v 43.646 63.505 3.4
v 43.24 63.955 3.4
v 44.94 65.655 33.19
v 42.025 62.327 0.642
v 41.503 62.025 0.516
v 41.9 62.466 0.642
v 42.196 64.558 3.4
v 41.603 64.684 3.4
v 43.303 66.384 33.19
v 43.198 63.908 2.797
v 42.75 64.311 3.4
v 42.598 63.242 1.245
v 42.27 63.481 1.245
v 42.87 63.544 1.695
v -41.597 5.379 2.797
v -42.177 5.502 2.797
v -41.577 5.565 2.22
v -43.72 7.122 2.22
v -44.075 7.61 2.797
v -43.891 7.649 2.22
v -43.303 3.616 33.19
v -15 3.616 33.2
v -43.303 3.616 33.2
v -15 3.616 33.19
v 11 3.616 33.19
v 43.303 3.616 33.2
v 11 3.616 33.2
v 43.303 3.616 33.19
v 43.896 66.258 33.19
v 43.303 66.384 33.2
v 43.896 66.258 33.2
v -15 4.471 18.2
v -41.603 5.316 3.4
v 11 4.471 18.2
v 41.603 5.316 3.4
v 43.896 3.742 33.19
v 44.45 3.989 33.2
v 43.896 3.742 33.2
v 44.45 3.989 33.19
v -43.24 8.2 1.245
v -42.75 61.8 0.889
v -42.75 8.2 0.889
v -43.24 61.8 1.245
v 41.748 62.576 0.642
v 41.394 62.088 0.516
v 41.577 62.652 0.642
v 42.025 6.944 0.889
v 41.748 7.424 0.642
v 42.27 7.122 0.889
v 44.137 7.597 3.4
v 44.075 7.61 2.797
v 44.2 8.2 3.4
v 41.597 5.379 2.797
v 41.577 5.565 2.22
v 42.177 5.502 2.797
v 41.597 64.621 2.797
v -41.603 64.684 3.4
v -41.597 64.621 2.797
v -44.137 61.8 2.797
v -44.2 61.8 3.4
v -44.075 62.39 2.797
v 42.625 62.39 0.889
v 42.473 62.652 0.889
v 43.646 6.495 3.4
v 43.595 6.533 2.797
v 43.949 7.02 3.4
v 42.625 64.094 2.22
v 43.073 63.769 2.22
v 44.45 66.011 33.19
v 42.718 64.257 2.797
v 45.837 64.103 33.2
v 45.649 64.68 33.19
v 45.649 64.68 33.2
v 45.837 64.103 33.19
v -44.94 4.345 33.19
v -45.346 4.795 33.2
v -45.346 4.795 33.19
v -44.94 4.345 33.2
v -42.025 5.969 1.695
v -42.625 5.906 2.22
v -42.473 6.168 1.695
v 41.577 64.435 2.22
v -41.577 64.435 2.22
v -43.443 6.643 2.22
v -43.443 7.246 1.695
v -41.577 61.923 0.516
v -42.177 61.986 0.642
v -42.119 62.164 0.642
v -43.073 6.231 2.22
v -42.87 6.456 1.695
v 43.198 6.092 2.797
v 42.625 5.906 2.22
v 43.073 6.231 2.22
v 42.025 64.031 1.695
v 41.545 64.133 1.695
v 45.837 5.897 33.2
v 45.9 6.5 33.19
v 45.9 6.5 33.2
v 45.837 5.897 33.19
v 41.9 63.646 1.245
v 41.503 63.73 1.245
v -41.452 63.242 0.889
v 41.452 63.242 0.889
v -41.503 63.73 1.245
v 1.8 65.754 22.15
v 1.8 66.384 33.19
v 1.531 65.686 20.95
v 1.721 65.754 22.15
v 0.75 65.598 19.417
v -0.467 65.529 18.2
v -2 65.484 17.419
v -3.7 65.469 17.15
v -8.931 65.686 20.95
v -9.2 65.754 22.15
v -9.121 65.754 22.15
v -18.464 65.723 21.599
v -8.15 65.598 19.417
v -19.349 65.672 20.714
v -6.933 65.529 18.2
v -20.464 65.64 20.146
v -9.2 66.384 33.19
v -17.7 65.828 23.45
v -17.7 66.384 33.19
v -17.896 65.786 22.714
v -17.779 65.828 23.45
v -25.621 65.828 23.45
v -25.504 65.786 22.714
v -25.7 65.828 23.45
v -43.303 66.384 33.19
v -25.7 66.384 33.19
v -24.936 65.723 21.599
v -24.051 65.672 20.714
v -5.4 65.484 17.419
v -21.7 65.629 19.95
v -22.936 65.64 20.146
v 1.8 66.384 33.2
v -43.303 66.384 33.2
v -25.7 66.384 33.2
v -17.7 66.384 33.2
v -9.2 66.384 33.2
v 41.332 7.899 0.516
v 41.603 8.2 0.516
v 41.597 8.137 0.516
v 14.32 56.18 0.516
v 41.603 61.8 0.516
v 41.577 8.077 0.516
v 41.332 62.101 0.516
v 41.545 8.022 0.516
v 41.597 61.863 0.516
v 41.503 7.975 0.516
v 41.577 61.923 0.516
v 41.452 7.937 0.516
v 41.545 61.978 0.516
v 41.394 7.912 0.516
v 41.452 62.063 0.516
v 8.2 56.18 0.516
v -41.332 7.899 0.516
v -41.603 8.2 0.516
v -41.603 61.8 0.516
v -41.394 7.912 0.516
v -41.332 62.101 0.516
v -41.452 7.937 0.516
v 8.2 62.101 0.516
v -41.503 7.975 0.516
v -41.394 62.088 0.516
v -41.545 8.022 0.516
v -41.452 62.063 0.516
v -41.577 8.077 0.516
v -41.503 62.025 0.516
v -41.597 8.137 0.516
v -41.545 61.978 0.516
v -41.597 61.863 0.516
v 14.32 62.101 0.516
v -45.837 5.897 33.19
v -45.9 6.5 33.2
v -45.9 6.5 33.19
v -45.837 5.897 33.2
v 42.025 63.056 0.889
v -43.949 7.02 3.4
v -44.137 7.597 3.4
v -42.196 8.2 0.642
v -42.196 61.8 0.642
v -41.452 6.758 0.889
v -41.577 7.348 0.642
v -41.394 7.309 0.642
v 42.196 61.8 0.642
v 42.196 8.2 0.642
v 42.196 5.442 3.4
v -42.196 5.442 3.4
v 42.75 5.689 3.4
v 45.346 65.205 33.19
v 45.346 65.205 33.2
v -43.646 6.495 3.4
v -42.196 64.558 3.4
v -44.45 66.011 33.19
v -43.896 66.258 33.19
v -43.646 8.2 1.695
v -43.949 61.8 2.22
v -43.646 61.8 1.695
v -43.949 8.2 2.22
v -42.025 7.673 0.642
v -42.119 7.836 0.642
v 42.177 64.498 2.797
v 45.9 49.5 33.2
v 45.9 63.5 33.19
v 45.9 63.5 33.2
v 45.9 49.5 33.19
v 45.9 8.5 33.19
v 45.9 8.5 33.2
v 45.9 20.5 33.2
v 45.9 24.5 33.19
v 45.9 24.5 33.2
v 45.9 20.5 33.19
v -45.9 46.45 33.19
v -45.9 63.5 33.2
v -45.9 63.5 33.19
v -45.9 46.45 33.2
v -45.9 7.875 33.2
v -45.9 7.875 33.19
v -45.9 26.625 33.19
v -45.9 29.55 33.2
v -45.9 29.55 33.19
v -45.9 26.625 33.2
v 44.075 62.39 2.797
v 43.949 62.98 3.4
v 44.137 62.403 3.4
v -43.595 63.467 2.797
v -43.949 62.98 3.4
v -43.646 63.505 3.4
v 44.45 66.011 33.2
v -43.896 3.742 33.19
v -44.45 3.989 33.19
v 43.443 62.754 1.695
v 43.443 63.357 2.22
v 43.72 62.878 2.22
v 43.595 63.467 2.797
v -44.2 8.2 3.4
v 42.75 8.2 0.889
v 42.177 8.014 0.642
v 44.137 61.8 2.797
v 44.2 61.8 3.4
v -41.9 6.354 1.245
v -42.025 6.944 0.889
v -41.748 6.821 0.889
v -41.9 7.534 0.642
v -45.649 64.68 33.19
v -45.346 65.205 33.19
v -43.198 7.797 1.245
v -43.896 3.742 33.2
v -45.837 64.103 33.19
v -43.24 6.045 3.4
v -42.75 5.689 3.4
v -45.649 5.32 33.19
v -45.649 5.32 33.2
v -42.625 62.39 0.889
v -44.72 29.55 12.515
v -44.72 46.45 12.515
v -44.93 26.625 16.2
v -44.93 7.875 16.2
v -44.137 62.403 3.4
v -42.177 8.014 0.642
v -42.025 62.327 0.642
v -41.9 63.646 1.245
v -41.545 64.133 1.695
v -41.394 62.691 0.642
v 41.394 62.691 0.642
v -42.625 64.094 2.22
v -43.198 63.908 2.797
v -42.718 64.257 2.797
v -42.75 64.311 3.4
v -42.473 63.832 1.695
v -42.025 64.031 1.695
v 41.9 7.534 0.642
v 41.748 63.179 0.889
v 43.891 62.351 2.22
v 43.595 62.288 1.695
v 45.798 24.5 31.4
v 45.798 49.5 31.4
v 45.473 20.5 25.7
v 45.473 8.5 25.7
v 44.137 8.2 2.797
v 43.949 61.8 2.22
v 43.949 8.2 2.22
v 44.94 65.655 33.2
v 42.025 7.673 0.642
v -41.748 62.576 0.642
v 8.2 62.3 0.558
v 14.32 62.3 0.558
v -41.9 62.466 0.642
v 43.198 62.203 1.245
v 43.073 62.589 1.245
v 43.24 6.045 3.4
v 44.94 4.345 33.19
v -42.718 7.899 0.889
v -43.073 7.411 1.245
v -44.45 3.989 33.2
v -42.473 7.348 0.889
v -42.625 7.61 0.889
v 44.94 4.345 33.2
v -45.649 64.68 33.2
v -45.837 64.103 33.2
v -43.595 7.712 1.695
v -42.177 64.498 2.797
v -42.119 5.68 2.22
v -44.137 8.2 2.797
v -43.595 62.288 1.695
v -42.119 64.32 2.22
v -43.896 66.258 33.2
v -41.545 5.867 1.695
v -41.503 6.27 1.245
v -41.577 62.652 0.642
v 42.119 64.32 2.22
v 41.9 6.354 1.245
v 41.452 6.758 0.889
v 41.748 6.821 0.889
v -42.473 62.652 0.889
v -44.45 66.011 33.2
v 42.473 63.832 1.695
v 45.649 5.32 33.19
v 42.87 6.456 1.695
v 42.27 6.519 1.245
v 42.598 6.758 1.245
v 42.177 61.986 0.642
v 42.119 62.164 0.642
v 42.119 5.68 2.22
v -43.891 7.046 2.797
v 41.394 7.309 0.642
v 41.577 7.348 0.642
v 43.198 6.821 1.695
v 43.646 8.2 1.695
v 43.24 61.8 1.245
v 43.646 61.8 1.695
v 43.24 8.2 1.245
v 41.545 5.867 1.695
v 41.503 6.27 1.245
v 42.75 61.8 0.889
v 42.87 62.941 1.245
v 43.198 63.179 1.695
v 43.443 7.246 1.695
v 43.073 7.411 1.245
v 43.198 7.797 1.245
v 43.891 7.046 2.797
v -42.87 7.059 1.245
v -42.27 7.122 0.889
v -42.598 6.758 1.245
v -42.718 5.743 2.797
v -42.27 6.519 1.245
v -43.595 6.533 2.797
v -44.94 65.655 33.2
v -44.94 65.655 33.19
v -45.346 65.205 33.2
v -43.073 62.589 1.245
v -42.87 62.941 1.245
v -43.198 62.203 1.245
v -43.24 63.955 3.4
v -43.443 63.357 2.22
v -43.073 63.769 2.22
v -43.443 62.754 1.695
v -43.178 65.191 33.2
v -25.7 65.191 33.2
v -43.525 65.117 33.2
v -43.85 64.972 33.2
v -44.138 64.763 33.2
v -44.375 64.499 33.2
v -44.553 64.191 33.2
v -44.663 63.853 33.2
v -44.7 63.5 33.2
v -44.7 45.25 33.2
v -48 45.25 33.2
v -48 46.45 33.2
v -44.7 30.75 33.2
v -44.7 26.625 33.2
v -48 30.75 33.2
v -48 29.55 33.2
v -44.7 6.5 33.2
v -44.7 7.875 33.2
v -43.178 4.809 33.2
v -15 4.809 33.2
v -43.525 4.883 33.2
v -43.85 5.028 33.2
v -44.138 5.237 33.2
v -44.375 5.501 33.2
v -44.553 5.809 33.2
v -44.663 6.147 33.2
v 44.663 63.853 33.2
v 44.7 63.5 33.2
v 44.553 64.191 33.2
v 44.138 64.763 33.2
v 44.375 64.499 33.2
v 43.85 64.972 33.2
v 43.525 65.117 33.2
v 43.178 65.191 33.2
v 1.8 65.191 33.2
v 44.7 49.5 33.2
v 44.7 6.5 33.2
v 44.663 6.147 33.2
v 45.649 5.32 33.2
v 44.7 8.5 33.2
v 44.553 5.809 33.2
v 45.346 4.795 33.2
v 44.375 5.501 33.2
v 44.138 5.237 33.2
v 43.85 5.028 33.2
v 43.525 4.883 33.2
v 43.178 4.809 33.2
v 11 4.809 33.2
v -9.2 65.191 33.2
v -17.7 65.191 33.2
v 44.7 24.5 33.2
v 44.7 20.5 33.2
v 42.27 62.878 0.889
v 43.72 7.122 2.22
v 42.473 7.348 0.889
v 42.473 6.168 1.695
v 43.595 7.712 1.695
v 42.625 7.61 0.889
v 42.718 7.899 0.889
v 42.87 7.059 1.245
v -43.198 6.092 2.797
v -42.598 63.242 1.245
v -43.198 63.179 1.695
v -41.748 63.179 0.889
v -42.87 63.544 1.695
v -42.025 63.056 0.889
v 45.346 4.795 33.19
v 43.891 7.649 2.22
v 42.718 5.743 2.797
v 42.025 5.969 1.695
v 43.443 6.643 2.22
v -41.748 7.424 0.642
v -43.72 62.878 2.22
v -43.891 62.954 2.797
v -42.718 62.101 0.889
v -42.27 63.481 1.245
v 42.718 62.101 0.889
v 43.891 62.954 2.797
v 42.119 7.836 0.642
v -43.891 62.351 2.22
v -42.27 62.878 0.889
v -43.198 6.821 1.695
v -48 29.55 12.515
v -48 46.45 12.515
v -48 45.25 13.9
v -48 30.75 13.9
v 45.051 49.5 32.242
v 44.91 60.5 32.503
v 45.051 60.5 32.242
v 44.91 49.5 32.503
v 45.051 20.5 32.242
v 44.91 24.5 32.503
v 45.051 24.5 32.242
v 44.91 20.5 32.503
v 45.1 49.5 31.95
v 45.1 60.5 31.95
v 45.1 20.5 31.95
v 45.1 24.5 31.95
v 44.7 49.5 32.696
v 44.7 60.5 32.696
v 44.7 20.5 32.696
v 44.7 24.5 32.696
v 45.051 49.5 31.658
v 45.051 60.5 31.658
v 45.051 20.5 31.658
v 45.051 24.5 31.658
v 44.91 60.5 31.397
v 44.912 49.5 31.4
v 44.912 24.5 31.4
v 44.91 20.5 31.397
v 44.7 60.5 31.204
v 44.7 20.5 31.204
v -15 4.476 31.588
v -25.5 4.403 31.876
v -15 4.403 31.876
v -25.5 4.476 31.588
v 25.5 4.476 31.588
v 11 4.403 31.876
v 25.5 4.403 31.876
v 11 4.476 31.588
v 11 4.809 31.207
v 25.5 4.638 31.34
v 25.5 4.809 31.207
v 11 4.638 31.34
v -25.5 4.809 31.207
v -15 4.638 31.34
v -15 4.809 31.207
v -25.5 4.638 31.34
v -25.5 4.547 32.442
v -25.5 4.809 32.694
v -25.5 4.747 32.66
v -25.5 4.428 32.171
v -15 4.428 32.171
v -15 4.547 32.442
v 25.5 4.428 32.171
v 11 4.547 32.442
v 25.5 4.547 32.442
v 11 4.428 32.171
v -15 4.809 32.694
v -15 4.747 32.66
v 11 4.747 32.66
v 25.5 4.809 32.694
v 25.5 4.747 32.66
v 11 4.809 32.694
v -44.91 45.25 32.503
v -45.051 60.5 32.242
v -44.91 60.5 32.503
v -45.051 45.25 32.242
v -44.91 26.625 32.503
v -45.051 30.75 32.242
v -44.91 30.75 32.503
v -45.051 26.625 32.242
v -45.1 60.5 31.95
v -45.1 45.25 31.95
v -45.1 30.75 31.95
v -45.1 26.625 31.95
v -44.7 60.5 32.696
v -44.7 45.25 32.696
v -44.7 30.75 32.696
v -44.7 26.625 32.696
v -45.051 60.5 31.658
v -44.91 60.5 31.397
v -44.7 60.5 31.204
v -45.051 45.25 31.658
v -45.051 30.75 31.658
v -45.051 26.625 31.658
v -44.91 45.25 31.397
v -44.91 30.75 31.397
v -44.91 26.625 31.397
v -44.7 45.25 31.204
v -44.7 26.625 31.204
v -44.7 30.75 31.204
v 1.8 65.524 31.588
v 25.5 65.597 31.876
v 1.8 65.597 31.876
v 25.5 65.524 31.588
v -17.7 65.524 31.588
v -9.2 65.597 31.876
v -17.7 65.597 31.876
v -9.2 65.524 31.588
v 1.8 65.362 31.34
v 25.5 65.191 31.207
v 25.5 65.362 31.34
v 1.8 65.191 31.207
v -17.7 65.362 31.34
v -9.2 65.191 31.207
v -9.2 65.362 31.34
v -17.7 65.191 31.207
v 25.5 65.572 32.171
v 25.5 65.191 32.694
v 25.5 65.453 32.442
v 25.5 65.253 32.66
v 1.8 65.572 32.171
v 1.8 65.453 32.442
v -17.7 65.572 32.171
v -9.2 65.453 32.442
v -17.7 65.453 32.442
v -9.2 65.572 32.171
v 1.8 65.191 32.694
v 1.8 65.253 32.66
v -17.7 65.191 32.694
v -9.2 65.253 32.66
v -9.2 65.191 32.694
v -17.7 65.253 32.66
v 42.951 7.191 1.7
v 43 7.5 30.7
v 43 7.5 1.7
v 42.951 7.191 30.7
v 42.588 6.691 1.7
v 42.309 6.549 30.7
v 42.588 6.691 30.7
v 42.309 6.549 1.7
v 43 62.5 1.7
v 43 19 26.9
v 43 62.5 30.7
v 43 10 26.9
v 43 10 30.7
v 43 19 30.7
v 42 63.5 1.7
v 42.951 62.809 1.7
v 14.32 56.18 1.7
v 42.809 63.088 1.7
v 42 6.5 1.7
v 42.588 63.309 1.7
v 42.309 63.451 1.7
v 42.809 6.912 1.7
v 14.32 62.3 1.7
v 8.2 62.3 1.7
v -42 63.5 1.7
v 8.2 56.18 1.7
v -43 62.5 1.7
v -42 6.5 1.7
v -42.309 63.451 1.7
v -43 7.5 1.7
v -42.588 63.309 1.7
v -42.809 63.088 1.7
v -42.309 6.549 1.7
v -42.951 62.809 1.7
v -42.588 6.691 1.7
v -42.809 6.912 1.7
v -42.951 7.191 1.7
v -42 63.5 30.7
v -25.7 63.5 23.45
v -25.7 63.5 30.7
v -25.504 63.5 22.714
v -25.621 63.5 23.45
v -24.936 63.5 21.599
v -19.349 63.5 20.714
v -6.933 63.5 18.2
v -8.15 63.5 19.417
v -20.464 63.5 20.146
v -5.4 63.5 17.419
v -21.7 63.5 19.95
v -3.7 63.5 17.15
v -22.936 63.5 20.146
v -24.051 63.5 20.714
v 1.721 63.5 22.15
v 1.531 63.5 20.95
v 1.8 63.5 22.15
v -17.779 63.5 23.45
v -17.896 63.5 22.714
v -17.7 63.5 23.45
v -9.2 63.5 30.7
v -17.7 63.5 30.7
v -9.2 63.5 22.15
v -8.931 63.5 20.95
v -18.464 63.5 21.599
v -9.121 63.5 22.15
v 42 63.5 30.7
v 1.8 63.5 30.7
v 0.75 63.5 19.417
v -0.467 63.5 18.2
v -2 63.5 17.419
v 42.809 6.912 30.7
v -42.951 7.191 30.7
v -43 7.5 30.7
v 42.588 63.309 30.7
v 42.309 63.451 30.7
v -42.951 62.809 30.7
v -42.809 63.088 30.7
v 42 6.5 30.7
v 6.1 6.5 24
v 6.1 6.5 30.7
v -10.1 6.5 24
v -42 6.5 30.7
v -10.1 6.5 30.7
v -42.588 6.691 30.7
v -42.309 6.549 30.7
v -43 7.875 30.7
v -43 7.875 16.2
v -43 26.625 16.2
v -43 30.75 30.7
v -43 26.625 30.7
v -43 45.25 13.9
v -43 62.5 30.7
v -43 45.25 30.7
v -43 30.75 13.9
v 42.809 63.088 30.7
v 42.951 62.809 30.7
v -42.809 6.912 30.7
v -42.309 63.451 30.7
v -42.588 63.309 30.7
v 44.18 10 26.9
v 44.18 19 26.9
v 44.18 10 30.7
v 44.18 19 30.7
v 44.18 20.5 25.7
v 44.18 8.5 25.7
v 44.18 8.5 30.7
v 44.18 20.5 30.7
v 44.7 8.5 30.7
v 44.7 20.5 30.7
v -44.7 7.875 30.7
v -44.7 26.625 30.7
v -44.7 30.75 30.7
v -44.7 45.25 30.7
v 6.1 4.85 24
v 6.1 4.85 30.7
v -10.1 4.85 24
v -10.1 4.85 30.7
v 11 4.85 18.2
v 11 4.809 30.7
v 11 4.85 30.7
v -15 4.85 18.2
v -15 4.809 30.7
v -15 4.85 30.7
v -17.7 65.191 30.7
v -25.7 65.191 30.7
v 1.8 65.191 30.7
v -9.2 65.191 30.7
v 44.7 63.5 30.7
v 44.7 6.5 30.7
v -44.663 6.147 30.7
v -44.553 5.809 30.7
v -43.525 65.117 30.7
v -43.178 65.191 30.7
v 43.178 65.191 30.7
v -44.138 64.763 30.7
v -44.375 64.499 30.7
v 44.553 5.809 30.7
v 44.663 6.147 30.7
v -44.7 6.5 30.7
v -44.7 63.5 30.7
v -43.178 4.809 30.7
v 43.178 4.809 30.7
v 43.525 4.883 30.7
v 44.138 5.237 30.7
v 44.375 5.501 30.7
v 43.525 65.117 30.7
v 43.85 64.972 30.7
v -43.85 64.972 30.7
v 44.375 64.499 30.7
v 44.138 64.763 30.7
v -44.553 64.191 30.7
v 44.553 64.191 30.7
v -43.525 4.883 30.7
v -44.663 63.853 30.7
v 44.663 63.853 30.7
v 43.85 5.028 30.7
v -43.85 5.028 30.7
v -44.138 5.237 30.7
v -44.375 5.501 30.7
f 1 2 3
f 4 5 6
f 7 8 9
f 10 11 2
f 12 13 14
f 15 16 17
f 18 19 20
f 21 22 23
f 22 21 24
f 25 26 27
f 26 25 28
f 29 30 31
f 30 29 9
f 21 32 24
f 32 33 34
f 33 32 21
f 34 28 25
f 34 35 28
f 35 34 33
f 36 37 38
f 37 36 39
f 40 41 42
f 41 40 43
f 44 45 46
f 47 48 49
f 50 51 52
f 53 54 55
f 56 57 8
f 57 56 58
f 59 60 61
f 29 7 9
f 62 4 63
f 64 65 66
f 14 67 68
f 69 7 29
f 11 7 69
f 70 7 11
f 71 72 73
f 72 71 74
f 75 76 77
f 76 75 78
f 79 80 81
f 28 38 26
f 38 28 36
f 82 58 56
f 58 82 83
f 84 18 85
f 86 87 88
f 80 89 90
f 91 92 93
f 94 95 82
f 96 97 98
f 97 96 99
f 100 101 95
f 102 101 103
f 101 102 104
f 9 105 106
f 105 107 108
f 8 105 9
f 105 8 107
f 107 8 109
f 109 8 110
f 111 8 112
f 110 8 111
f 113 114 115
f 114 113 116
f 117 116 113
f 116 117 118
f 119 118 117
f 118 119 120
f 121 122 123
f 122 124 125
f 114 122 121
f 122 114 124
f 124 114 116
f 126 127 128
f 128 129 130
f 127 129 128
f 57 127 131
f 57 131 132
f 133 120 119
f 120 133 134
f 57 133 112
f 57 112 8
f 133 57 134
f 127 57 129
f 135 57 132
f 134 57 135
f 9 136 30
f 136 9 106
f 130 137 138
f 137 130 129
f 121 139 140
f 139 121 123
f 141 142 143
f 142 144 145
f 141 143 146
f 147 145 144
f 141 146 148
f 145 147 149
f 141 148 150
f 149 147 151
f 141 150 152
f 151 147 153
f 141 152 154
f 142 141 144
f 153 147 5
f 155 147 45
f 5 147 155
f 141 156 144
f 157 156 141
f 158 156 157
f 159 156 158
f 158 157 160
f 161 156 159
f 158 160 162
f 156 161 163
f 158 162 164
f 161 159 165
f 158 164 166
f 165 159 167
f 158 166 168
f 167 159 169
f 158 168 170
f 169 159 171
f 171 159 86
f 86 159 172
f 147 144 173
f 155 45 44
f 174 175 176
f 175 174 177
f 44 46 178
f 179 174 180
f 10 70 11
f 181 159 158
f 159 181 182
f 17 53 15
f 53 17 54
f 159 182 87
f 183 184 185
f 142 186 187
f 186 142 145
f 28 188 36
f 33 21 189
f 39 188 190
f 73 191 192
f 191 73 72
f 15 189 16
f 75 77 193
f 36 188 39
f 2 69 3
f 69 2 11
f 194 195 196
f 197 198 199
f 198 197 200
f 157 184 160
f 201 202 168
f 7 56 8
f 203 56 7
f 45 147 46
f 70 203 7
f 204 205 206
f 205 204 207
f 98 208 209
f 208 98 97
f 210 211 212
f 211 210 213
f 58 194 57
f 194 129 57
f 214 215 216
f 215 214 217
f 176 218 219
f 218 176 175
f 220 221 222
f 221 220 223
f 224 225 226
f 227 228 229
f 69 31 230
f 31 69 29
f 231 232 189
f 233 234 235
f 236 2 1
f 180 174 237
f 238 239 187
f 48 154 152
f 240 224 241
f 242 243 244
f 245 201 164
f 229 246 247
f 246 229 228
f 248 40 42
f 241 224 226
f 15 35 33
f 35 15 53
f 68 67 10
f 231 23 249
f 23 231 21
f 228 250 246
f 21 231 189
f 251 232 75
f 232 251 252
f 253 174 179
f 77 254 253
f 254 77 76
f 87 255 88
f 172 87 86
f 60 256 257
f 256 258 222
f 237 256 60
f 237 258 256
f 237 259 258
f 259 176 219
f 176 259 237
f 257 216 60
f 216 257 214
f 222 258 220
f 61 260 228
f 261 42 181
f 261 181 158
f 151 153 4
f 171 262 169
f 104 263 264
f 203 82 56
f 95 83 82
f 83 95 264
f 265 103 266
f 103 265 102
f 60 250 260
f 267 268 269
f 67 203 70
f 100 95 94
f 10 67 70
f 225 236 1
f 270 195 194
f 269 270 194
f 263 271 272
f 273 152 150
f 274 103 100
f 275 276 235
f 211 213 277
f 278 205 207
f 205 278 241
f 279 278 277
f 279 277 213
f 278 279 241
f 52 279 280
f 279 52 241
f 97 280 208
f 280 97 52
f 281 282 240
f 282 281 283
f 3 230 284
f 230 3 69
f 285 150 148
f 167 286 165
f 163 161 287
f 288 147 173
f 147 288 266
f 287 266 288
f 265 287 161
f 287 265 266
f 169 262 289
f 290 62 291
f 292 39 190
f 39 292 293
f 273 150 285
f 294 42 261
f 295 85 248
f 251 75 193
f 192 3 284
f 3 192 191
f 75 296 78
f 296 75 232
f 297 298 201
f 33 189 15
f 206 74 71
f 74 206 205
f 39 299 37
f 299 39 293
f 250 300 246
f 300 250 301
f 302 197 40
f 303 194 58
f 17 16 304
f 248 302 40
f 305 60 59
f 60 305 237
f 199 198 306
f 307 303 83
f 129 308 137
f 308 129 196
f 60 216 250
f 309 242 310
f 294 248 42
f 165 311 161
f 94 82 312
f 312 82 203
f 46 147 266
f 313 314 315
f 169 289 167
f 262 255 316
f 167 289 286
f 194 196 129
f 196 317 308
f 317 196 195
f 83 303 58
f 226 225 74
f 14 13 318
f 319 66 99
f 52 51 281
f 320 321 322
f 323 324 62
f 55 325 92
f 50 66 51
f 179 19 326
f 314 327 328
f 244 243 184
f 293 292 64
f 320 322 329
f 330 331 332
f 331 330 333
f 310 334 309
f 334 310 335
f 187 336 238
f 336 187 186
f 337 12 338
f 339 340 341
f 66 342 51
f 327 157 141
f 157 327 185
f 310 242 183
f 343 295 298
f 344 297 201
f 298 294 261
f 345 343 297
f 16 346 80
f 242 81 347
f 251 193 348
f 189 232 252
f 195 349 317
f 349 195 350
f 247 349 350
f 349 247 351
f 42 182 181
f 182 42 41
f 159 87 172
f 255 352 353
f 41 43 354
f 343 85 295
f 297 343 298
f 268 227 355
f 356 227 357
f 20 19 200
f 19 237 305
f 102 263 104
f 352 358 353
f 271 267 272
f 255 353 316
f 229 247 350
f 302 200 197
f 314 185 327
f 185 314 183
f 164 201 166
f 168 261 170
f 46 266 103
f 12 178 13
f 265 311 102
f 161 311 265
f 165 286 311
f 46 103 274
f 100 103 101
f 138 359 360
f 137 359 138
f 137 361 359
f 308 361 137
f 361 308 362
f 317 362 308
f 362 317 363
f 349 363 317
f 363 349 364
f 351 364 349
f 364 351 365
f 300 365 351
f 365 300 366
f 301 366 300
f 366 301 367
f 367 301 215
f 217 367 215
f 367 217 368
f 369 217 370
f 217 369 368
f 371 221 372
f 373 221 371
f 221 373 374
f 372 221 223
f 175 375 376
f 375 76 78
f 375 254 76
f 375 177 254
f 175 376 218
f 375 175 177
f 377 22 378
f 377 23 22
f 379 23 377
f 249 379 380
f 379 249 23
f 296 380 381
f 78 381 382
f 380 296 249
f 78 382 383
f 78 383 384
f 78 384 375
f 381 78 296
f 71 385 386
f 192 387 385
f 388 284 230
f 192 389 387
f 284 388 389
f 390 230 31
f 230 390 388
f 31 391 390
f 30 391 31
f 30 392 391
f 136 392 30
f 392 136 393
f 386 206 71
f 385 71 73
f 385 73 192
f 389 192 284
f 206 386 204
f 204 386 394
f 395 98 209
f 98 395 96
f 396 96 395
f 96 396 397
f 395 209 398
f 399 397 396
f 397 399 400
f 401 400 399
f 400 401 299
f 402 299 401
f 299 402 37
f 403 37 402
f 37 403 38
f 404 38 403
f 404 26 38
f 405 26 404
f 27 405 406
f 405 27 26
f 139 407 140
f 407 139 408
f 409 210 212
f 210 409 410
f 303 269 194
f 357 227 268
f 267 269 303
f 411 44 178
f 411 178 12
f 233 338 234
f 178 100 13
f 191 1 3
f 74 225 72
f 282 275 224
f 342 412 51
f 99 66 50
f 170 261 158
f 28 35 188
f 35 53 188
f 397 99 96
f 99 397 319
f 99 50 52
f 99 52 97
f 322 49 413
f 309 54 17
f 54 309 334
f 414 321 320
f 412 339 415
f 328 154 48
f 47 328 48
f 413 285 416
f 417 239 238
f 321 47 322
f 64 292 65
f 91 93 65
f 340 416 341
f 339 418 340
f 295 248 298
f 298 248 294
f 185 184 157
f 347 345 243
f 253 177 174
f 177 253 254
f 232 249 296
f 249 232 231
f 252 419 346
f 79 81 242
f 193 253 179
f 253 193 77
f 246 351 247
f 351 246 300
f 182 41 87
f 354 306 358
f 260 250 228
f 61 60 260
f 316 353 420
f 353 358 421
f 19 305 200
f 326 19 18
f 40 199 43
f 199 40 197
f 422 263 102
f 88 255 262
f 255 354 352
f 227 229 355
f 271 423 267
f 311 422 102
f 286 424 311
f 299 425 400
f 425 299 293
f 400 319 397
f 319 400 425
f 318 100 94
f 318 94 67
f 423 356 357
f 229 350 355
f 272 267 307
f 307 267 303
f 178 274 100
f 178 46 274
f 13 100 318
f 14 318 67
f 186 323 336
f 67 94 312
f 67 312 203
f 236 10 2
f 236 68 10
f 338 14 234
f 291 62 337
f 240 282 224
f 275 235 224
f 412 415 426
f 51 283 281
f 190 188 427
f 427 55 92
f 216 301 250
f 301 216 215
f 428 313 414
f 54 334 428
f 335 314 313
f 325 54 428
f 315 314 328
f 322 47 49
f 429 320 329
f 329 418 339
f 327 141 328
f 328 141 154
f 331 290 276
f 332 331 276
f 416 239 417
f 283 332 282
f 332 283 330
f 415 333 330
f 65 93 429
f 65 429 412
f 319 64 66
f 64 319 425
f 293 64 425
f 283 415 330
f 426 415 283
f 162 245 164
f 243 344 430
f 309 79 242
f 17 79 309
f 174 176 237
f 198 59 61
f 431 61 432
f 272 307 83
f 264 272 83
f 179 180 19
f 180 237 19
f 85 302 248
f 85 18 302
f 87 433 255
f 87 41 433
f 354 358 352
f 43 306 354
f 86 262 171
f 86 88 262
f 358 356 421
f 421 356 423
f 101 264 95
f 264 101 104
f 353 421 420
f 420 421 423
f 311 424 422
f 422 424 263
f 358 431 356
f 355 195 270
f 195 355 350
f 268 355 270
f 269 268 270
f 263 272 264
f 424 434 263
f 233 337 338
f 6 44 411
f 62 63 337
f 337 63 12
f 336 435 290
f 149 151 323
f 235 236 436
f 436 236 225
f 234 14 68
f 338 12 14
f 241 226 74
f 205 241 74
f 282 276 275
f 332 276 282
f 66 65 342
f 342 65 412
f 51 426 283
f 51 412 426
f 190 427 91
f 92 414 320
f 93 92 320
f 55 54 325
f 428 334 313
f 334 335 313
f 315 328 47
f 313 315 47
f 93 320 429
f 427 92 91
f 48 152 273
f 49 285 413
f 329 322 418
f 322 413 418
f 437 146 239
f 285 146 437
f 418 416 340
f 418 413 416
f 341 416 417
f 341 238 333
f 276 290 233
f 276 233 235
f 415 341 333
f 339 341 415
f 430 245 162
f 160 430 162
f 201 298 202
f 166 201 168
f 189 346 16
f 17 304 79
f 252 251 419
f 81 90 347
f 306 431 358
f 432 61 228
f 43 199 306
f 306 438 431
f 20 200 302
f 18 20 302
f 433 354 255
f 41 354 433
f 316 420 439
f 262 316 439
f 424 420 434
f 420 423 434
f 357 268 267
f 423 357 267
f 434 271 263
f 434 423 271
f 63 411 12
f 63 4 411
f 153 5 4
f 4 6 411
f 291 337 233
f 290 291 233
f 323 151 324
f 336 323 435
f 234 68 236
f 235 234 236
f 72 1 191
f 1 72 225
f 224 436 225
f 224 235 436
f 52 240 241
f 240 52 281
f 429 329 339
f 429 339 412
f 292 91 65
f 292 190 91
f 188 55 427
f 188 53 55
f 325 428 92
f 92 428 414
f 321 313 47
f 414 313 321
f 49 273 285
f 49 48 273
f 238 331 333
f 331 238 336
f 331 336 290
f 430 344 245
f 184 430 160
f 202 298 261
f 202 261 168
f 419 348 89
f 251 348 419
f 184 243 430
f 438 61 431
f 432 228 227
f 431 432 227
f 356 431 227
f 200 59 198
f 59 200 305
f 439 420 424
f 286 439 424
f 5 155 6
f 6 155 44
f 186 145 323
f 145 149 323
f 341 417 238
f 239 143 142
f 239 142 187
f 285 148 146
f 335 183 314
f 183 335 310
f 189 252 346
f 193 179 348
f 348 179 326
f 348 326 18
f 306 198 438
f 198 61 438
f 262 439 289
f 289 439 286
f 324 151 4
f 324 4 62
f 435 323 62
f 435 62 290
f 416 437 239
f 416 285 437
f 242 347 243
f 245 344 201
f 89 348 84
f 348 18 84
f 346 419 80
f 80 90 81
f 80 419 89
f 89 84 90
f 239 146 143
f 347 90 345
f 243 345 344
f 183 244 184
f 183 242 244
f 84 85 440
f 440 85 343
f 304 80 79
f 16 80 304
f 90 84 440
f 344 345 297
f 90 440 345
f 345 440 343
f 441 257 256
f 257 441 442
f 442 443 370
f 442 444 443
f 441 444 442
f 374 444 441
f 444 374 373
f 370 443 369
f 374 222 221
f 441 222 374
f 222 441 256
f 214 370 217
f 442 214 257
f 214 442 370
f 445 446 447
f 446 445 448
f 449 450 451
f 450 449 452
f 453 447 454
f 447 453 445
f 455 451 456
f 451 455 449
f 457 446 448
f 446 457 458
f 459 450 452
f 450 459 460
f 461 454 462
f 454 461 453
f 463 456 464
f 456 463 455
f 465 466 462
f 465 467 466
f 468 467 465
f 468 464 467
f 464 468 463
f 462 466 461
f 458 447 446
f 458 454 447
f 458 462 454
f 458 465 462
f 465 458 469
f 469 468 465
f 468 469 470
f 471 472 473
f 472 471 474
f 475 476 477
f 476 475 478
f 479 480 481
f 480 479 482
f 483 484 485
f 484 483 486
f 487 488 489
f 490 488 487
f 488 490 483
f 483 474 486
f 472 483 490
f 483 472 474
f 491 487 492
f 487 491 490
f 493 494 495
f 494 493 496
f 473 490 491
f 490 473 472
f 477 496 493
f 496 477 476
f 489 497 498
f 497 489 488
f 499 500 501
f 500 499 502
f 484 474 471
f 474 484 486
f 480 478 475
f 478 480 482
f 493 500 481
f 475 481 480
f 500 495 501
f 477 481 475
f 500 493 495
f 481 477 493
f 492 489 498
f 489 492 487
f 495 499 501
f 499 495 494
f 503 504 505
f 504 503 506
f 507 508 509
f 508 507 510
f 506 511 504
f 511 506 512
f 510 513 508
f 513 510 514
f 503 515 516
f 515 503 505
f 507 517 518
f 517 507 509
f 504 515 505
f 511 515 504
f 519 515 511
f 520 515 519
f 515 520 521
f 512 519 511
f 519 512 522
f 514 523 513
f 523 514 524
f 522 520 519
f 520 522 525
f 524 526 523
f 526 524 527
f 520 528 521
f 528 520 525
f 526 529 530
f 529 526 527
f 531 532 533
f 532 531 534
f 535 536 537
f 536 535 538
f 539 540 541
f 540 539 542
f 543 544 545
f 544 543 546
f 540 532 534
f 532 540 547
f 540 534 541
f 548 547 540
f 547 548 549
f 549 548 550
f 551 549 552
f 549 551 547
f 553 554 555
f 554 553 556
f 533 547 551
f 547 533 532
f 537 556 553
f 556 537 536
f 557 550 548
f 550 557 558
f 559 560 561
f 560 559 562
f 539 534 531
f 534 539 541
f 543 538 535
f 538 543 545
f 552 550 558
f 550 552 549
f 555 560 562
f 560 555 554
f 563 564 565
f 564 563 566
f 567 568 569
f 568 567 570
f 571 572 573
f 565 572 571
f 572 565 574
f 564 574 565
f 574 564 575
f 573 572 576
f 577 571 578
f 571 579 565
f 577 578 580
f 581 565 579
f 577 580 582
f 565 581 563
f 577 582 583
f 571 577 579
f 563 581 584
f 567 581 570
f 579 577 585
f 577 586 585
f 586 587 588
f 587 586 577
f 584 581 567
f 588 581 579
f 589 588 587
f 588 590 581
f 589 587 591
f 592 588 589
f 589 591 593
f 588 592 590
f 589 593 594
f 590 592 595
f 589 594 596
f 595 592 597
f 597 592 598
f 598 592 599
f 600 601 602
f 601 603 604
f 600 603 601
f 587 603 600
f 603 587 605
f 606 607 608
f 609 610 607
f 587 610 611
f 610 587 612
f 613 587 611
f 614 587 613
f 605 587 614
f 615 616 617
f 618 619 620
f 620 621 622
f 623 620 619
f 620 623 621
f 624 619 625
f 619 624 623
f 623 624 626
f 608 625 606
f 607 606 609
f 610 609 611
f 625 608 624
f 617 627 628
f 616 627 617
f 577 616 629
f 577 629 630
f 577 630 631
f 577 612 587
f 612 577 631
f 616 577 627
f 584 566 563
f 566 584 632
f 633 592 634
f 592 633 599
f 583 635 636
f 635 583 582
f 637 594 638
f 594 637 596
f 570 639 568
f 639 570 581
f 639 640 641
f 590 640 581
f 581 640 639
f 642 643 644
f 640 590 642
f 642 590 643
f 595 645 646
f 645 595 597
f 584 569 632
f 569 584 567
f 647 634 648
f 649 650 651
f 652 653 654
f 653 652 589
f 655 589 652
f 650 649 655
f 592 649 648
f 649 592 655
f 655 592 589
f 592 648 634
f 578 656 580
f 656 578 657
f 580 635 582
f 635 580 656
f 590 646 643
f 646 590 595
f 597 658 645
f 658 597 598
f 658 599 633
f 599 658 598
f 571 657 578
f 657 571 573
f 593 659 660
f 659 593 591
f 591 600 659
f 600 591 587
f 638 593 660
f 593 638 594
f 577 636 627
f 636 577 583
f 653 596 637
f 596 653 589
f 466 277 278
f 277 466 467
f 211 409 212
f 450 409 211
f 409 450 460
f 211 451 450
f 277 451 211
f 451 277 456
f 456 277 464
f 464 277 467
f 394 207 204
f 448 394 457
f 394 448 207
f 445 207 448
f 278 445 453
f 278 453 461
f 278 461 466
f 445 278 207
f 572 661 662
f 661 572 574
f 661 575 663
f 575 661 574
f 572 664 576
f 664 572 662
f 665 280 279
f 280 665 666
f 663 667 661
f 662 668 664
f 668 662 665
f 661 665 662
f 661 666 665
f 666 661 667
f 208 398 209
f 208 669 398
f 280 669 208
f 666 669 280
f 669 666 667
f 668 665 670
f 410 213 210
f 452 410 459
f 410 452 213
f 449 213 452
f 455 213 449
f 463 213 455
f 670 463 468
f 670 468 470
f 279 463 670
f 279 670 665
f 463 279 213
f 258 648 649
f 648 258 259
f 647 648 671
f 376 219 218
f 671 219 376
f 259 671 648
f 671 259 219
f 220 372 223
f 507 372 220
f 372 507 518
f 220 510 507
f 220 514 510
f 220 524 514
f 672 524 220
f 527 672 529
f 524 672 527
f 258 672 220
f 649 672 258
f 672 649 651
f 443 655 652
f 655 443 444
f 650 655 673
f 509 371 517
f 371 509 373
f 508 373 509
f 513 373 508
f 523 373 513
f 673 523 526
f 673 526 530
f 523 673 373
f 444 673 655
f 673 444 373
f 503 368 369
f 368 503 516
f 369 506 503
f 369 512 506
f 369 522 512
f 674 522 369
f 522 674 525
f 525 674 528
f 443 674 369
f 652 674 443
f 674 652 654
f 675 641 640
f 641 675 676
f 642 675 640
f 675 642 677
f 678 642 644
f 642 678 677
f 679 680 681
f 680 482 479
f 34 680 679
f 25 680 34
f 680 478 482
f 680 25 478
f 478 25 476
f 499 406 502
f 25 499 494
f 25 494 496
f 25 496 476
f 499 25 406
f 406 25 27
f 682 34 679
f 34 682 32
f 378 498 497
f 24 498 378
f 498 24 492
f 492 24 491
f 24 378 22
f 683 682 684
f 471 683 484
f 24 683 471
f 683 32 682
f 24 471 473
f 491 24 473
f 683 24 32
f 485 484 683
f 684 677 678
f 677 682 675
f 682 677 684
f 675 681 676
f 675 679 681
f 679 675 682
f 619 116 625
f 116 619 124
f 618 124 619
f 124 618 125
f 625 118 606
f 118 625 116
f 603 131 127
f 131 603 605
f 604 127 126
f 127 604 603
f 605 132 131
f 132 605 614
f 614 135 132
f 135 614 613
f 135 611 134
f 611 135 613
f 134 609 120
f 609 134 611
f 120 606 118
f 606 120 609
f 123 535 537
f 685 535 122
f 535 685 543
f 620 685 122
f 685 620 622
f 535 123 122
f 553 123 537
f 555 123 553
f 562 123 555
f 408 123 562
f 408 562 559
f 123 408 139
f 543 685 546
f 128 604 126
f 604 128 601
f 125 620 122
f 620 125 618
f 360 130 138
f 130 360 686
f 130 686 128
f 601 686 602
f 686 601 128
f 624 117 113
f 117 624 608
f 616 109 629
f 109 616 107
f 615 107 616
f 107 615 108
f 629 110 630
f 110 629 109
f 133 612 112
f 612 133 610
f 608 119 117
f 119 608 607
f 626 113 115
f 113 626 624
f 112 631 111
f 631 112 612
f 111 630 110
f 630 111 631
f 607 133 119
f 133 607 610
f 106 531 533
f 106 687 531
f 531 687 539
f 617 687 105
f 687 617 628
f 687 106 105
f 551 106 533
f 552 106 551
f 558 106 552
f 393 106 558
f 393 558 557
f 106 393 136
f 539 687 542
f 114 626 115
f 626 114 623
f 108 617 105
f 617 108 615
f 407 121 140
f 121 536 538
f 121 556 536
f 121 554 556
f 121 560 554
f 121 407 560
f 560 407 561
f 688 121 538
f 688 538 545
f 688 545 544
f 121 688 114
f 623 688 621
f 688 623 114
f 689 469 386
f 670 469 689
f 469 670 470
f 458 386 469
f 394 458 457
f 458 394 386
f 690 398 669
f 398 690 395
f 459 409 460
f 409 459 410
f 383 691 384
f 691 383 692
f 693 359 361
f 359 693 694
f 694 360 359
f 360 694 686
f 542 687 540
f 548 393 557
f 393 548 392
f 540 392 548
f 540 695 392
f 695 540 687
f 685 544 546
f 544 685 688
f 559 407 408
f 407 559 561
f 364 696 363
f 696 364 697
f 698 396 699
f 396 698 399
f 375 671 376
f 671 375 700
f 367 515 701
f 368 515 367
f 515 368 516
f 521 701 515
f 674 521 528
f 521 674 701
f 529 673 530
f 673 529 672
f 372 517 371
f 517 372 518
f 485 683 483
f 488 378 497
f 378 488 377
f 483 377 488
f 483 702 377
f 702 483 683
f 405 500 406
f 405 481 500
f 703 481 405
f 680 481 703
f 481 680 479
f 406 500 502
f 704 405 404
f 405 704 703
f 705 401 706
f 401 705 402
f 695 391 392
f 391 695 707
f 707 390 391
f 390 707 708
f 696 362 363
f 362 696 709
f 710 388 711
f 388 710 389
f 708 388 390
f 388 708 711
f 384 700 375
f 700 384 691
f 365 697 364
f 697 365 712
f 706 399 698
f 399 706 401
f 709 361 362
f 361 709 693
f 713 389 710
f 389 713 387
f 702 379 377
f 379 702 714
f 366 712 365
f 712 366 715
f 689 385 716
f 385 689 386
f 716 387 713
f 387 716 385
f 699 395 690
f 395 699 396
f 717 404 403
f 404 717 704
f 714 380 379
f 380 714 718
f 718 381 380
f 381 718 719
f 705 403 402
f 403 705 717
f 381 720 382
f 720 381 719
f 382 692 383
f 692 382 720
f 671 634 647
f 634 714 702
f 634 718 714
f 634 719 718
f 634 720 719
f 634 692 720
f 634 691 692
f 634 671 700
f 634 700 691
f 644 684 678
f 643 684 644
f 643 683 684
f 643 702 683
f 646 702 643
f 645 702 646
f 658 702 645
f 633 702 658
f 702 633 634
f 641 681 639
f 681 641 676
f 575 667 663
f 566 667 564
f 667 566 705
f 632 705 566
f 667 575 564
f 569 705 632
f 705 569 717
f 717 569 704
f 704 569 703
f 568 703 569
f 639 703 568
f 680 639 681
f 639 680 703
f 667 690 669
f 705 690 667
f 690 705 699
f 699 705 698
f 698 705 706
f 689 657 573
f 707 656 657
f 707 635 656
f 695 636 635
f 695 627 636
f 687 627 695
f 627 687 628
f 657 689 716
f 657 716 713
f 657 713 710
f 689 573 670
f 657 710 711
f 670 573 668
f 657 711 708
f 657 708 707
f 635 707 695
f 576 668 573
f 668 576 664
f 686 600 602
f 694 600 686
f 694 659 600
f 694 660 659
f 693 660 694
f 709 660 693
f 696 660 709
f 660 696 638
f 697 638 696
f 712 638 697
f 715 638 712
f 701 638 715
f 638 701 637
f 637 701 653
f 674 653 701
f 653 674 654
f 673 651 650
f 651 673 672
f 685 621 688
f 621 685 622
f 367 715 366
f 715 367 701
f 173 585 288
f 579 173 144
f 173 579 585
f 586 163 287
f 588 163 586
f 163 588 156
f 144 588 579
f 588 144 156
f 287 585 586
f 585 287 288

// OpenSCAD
//
// raspberry pi original (A and B model)
//
// design by Egil Kvaleberg, 2 Aug 2015
//
// drawing of the B+ model, for referrence:
// https://www.raspberrypi.org/documentation/hardware/raspberrypi/mechanical/Raspberry-Pi-B-Plus-V1.2-Mechanical-Drawing.pdf
//
// notes:
// design origin is middle of PCB
//

part = "top"; // [ top, bottom, all, demo ]

have_plugrow = 1; // [ 1:true, 0:false ]
have_open_plugrow = 0; // [ 1:true, 0:false ]
have_camera = 0; // [ 1:true, 0:false ]
have_sdcard_support = 1; // [ 1:true, 0:false ]
have_leds = 0; // [ 1:true, 0:false ]
is_rev_b = 1; // [ 1:true, 0:false ]
pin_count = 2;

/* [Hidden] */
mil2mm = 0.0254;

pcb = [85.0, 56.0, 1.5]; // main board
pcb2floor = 4.0; // 3.5
pcb2roof = 29.0; // 15.7

pcbmnt2dia = 2.75; // mounting holes
pcbmnt2dx = 59.5 - pcb[0]/2; // 
pcbmnt2dy = pcb[1]/2 - 17.8;
pcbmnt3dx = 4.8 - pcb[0]/2;  // 
pcbmnt3dy = pcb[1]/2 - 43.5;
pcbmnthead = 6.2; // countersunk
pcbmntthreads = 2.2;
breakaway = 0.3; // have hidden hole for screw, 0 for no extra pegs 

cardsy = 24.0;
cardsz = 4.5;
cardsx = 32.0;
carddy = pcb[1]/2 - 30.0;

ethersy = 16.0; // ethernet contact width
ethersz = 13.5 + 0.5;
etherdy = pcb[1]/2 - 10.25;
usbsy = 13.5;
usbsz = 15.8 + 0.5;
usbdy = pcb[1]/2 - 31.0;
powerpsy = 11.0; // power plug width 
powerpsz = 4.5; // plug height
powerssy = 8.0; // power socket width 
powerssz = 3.3; // socket height
powerdz = -1.7; // for plug 
powerdy = pcb[1]/2 - 7.5;
hdmisx = 15.2; // hdmi contact width
hdmisz = 6.2;
hdmipsx = 25.0; // typical plug
hdmipsz = 12.0;
hdmidx = 40.5 - pcb[0]/2;
audior = 7.0; // audio contact radius
audiodz = 11.4 - 1.4 - 6.9/2 + 0.2; // above pcb
audiodx = 20.5 - pcb[0]/2 + 0.3;
videor = 10.0; // video contact radius
videodz = 13.3 - 1.4 - 8.1/2 + 0.2;  // above pcb
videodx = 39.0 - pcb[0]/2 - 0.2;
led1dx = 2.2 - pcb[0]/2;
led2dx = 9.2 - pcb[0]/2;
leddy = 7.1 - pcb[1]/2;
leddx = 2.0;

plugrow1 = [51.2+2.56/2 - pcb[0]/2, pcb[1]/2 - (54.8-5.12/2), 0]; // coordinates D7 pin, mid

cam_box = 34.5;

frame_w = 2.5; // width of lip for frame 
snap_dia = 1.8; // snap lock ridge diameter
snap_len = 50.0; // snap lock length
tol = 0.5; // general tolerance

wall = 1.2; // general wall thickness
thinwall = 0.4;
corner_r = wall; // casing corner radius
corner2_r = wall+tol+wall; // corners of top casing
d = 0.01;

extra_y = 0; // extra space in y

module nut(af, h) { // af is 2*r
	cylinder(r=af/2/cos(30), h=h, $fn=6);
}

module c_cube(x, y, z) {
	translate([-x/2, -y/2, 0]) cube([x, y, z]);
}

module cr_cube(x, y, z, r) {
	hull() {
		for (dx=[-1,1]) for (dy=[-1,1]) translate([dx*(x/2-r), dy*(y/2-r), 0]) cylinder(r=r, h=z, $fn=20);
	}
}

module cr2_cube(x, y, z, r1, r2) {
	hull() {
		for (dx=[-1,1]) for (dy=[-1,1]) translate([dx*(x/2-r1), dy*(y/2-r1), 0]) cylinder(r1=r1, r2=r2, h=z, $fn=20);
	}
}

module bottom() {
	module snap2(ex) {
		translate([pcb[0]/2+tol+wall+ex, -snap_len/2, wall+pcb2floor+pcb[2]-frame_w/2]) rotate([-90, 0, 0]) cylinder(r=snap_dia/2, h=snap_len, $fs=0.3);
		translate([-snap_len/2, pcb[1]/2+tol+wall, wall+pcb2floor+pcb[2]-frame_w/2]) rotate([0, 90, 0]) cylinder(r=snap_dia/2, h=snap_len, $fs=0.3);
	}
    module plugs(extra) { 
        z0 = wall+pcb2floor+pcb[2];
        // card slot
        translate([pcb[0]/2, carddy, wall+pcb2floor+pcb[2]-cardsz-extra]) 
			c_cube(cardsx, cardsy+2*extra, cardsz+2*extra);
        // power plug (at left side)
        translate([pcb[0]/2+2.1*wall, powerdy, z0+powerdz-extra]) 
			c_cube(2*wall, powerpsy+2*extra, powerpsz+2*extra+frame_w);
        // hdmi socket (near side)
        translate([hdmidx, pcb[1]/2+19.9/2-8.25/2, -extra-frame_w]) 
			c_cube(hdmipsx+2*extra, 8.25, hdmipsz+2*extra+frame_w);    
    }
    module plugs_add() { 
        z0 = wall+pcb2floor+pcb[2];
        // audio plug (far side)
        difference() /*/ color("green")*/ {
            translate([audiodx, -pcb[1]/2 - 1.4*wall, z0-snap_dia/2-tol]) 
                c_cube(audior, 1.6*wall, audiodz+snap_dia);
            translate([audiodx, -pcb[1]/2 - wall/2 + d, z0+audiodz]) 
                rotate([90, 0, 0]) cylinder(r=audior/2+tol, h=1.8*wall+2*d, $fn=20);
        }
        // video plug (far side)
        difference() {
            translate([videodx, -pcb[1]/2 - 1.4*wall, z0-snap_dia/2-tol]) 
                c_cube(videor, 1.6*wall, videodz+snap_dia);
            translate([videodx, -pcb[1]/2 - wall/2 + d, z0+videodz]) 
                rotate([90, 0, 0]) cylinder(r=videor/2+tol, h=1.8*wall+2*d, $fn=20);
        }
        // card slot
        if (have_sdcard_support) difference () {
            translate([pcb[0]/2 + cardsx/2/2, carddy, 0]) 
                c_cube(cardsx/2-2*d, cardsy+2*tol+2*wall, wall+frame_w-tol);
            plugs(tol);
        }
    }

	module add() {
		hull () for (x = [-1, 1]) for (y = [-1, 1])
			translate([x*(pcb[0]/2+tol+wall-corner_r) + (x>0 ? extra_y : 0), y*(pcb[1]/2+tol+wall-corner_r), corner_r]) {
				sphere(r = corner_r, $fs=0.3);
				cylinder(r = corner_r, h = wall+pcb2floor+pcb[2]-corner_r, $fs=0.3);
		}
		snap2(0);
        rotate([0, 0, 180]) snap2(0);
	}
	module sub() {
        module pedestal(dx, dy, hg, dia) {
            translate([dx, dy, wall]) {
				cylinder(r = dia/2+wall, h = hg, $fs=0.2);
                // pegs through pcb mount holes
                if (breakaway > 0) translate([0, 0, hg]) 
                        cylinder(r = dia/2 - tol, h = pcb[2]+d, $fs=0.2);
            }
        }
        module pedestal_hole(dx, dy, hg, dia) {
            translate([dx, dy, breakaway]) {	
				cylinder(r = dia/2, h = wall+hg-2*breakaway, $fs=0.2);
				cylinder(r = 1.0/2, h = wall+hg+pcb[2]+d, $fs=0.2); // needed to 'expose' internal structure so it dows not get removed
				cylinder(r1 = pcbmnthead/2 - breakaway, r2 = 0, h = pcbmnthead/2 - breakaway, $fs=0.2); // countersunk head
		    }
        }
		difference () {
			// pcb itself
			translate([-(pcb[0]/2+tol), -(pcb[1]/2+tol), wall])
				cube([2*tol+pcb[0], 2*tol+pcb[1], pcb2floor+pcb[2]+d]);
			// less pcb mount pedestals 
            pedestal(pcbmnt2dx, pcbmnt2dy, pcb2floor, pcbmnt2dia);
            pedestal(pcbmnt3dx, pcbmnt3dy, pcb2floor, pcbmnt2dia);
		}
		// hole for countersunk pcb mounting screws, hidden (can be broken away)
        pedestal_hole(pcbmnt2dx, pcbmnt2dy, pcb2floor, pcbmnt2dia);
        pedestal_hole(pcbmnt3dx, pcbmnt3dy, pcb2floor, pcbmnt2dia);
        plugs(tol);
	}
	difference () {
		add();
		sub();
	}
    plugs_add();
    
    //color("red") plugs(0);
}

// Z base is top of pcb
module top() {
	module snap2(ex) {
		translate([pcb[0]/2+tol+wall+ex, -snap_len/2-tol, -frame_w/2]) rotate([-90, 0, 0]) cylinder(r=snap_dia/2, h=snap_len+2*tol, $fs=0.3);
		translate([-snap_len/2-tol, pcb[1]/2+tol+wall, -frame_w/2]) rotate([0, 90, 0]) cylinder(r=snap_dia/2, h=snap_len+2*tol, $fs=0.3);
	}
    module plugs(extra) { 
        // card slot
        translate([pcb[0]/2, carddy, -cardsz-extra - 1.2]) // fudge 
			c_cube(19.9, cardsy+2*extra, cardsz+2*extra);
        // power socket (at left side)
        translate([pcb[0]/2, powerdy, -extra-frame_w]) 
			c_cube(19.9, powerssy+2*extra, powerssz+2*extra+frame_w);
        // room for power plug
        translate([pcb[0]/2+9.9/2+wall*1.4, powerdy, -extra-frame_w]) 
			c_cube(9.9, powerpsy+2*extra, powerpsz+2*extra+frame_w);
        if (is_rev_b) {
            // ether plug 
            translate([-pcb[0]/2, etherdy, -extra-frame_w]) 
                c_cube(19.9, etherdy+2*extra, ethersz+2*extra+frame_w);
        }
        // usb plug 
       translate([-pcb[0]/2, usbdy, -extra-frame_w]) 
				c_cube(19.9, usbsy+2*extra, usbsz+2*extra+frame_w);
        // hdmi socket (near side)
        translate([hdmidx, pcb[1]/2, -extra-frame_w]) 
			c_cube(hdmisx+2*extra, 19.9, hdmisz+2*extra+frame_w);
        translate([hdmidx, pcb[1]/2+19.9/2-7.8/2, -extra-frame_w]) 
			c_cube(hdmipsx+2*extra, 7.8, hdmipsz+2*extra+frame_w);
        // audio plug (far side)
        translate([audiodx, -pcb[1]/2 + 19.9/2, audiodz]) 
			rotate([90, 0, 0]) cylinder(r=audior/2+extra, h=19.9, $fn=20);
        translate([audiodx, -pcb[1]/2, -extra-frame_w]) 
			c_cube(audior+2*extra, 19.9, audiodz+2*extra+frame_w);
        // video plug (far side)
        translate([videodx, -pcb[1]/2 + 19.9/2, videodz]) 
			rotate([90, 0, 0]) cylinder(r=videor/2+extra, h=19.9, $fn=20);
        translate([videodx, -pcb[1]/2, -extra-frame_w]) 
			c_cube(videor+2*extra, 19.9, videodz+2*extra+frame_w);
        // camera opening
        if (have_camera) translate([-8.0, 0, pcb2roof - extra]) 
			c_cube(cam_box, cam_box, wall+2*extra);
    }
    module plugs_add() { 
       // usb plug 
       translate([-pcb[0]/2, usbdy, -frame_w]) 
				c_cube(11.0, usbsy+2*tol+2*wall, usbsz+tol+frame_w+wall+0.185);
    }
	module add() {
		hull () for (x = [-1, 1]) for (y = [-1, 1]) {
			translate([x*(pcb[0]/2+tol+wall-corner_r) + (x>0 ? extra_y : 0), y*(pcb[1]/2+tol+wall-corner_r), -frame_w]) 
				cylinder(r = corner_r+tol+wall, h = d, $fs=0.3); // include frame
			translate([x*(pcb[0]/2+tol+wall-corner2_r) + (x>0 ? extra_y : 0), y*(pcb[1]/2+tol+wall-corner2_r), pcb2roof+wall-corner2_r]) 
					sphere(r = corner2_r, $fs=0.3);	
		}
        plugs_add();
	}

	module sub() { 
		module plugrow_frame(xy, start, pins) {
			frmheight = 3.0;
            if (have_open_plugrow) translate([xy[0]+(start+(pins-1)/2)*2.56, xy[1], 1.0]) 
				c_cube(pins*2.56+2*tol+2*wall, 2*2.56+2*tol+2*wall, pcb2roof-1.0);
			else translate([xy[0]+(start+(pins-1)/2)*2.56, xy[1], frmheight]) 
				c_cube(pins*2.56+2*tol+2*wall, 2*2.56+2*tol+2*wall, pcb2roof-frmheight);
       }
		module plugrow_hole(xy, start, pins) {
			if (have_open_plugrow) translate([xy[0]+(start+(pins-1)/2)*2.56+9.9/2, xy[1]-9.9/2, -frame_w-d]) 
				c_cube(pins*2.56+2*tol+9.9, 2*2.56+2*tol+9.9, frame_w+pcb2roof+wall);
            else translate([xy[0]+(start+(pins-1)/2)*2.56, xy[1], 0]) 
				c_cube(pins*2.56+2*tol, 2*2.56+2*tol, pcb2roof+wall);
        }
        module led_frame(dx, leds) {
			frmheight = 1.0;
			for (n = [0:1:leds-1]) translate([dx+n*leddx, leddy, frmheight]) 
				cylinder(r=leddx/2+wall, h=pcb2roof+d-frmheight, $fn=16);
        }
        module led_hole(dx, leds) {
			for (n = [0:1:leds-1]) translate([dx+n*leddx, leddy, 0]) 
				cylinder(r=leddx/2-d, h=pcb2roof+wall+d, $fn=16);
            
        }
		// room for bottom case within frame 
		hull () for (x = [-1, 1]) for (y = [-1, 1])
			translate([x*(pcb[0]/2+tol+wall-corner_r) + (x>0 ? extra_y : 0), y*(pcb[1]/2+tol+wall-corner_r), -frame_w-d]) 
                cylinder(r = corner_r+tol, h = d+frame_w, $fs=0.3); 
		// snap lock
		snap2(0);
		rotate([0, 0, 180]) snap2(0);
		difference() { 
			// room for pcb
			translate([0, 0, -d]) cr_cube(2*tol+pcb[0], 2*tol+pcb[1], d+pcb2roof, 1.0);
			union () {
				// plug rows
				//if (have_plugrow || have_open_plugrow) 
				//	plugrow_frame(plugrow1, 0, pin_count);
                // leds
				if (have_leds) {
					led_frame(led1dx, 3);
                    led_frame(led2dx, 2);
                }
			}

		}
        // hole for usb, ether and power
        plugs(tol);
		// plug rows
		if (have_plugrow || have_open_plugrow) 
			plugrow_hole(plugrow1, 0, pin_count);
        // leds
		if (have_leds) {
			led_hole(led1dx, 3);
            led_hole(led2dx, 2);
        }
	}
	difference () {
		add();
		sub();
	}
    
    if (part == "demo") 
        color("red") plugs(0);
 
	// pcb support pegs
    /*
    translate([pcbmnt2dx, pcbmnt2dy, 0]) {
         difference () {
             cylinder(r1 = pcbmnt2dia/2 +wall, r2 = pcbmnt2dia/2 +2.5*wall, h = pcb2roof, $fs=0.2);
             translate([0, 0, -d]) cylinder(r = pcbmntthreads/2, h = pcb2roof, $fs=0.2); // hole
         }  
     }   
        
    translate([pcbmnt3dx, pcbmnt3dy, 0]) {
         difference () {
             cylinder(r1 = pcbmnt2dia/2 +wall, r2 = pcbmnt2dia/2 +2.5*wall, h = pcb2roof, $fs=0.2);
            translate([0, 0, -d]) cylinder(r = pcbmntthreads/2, h = pcb2roof, $fs=0.2); // hole
         }
    }
    */
} 


//

if (part=="demo") { bottom(); translate([0, 0, wall+pcb2floor+pcb[2]]) top(); }
if (part=="bottom" || part=="all") translate([0, -35, 0]) bottom();
if (part=="top" || part=="all") translate([-0, 35, pcb2roof+tol+wall]) rotate([180,0,0]) top();

	
